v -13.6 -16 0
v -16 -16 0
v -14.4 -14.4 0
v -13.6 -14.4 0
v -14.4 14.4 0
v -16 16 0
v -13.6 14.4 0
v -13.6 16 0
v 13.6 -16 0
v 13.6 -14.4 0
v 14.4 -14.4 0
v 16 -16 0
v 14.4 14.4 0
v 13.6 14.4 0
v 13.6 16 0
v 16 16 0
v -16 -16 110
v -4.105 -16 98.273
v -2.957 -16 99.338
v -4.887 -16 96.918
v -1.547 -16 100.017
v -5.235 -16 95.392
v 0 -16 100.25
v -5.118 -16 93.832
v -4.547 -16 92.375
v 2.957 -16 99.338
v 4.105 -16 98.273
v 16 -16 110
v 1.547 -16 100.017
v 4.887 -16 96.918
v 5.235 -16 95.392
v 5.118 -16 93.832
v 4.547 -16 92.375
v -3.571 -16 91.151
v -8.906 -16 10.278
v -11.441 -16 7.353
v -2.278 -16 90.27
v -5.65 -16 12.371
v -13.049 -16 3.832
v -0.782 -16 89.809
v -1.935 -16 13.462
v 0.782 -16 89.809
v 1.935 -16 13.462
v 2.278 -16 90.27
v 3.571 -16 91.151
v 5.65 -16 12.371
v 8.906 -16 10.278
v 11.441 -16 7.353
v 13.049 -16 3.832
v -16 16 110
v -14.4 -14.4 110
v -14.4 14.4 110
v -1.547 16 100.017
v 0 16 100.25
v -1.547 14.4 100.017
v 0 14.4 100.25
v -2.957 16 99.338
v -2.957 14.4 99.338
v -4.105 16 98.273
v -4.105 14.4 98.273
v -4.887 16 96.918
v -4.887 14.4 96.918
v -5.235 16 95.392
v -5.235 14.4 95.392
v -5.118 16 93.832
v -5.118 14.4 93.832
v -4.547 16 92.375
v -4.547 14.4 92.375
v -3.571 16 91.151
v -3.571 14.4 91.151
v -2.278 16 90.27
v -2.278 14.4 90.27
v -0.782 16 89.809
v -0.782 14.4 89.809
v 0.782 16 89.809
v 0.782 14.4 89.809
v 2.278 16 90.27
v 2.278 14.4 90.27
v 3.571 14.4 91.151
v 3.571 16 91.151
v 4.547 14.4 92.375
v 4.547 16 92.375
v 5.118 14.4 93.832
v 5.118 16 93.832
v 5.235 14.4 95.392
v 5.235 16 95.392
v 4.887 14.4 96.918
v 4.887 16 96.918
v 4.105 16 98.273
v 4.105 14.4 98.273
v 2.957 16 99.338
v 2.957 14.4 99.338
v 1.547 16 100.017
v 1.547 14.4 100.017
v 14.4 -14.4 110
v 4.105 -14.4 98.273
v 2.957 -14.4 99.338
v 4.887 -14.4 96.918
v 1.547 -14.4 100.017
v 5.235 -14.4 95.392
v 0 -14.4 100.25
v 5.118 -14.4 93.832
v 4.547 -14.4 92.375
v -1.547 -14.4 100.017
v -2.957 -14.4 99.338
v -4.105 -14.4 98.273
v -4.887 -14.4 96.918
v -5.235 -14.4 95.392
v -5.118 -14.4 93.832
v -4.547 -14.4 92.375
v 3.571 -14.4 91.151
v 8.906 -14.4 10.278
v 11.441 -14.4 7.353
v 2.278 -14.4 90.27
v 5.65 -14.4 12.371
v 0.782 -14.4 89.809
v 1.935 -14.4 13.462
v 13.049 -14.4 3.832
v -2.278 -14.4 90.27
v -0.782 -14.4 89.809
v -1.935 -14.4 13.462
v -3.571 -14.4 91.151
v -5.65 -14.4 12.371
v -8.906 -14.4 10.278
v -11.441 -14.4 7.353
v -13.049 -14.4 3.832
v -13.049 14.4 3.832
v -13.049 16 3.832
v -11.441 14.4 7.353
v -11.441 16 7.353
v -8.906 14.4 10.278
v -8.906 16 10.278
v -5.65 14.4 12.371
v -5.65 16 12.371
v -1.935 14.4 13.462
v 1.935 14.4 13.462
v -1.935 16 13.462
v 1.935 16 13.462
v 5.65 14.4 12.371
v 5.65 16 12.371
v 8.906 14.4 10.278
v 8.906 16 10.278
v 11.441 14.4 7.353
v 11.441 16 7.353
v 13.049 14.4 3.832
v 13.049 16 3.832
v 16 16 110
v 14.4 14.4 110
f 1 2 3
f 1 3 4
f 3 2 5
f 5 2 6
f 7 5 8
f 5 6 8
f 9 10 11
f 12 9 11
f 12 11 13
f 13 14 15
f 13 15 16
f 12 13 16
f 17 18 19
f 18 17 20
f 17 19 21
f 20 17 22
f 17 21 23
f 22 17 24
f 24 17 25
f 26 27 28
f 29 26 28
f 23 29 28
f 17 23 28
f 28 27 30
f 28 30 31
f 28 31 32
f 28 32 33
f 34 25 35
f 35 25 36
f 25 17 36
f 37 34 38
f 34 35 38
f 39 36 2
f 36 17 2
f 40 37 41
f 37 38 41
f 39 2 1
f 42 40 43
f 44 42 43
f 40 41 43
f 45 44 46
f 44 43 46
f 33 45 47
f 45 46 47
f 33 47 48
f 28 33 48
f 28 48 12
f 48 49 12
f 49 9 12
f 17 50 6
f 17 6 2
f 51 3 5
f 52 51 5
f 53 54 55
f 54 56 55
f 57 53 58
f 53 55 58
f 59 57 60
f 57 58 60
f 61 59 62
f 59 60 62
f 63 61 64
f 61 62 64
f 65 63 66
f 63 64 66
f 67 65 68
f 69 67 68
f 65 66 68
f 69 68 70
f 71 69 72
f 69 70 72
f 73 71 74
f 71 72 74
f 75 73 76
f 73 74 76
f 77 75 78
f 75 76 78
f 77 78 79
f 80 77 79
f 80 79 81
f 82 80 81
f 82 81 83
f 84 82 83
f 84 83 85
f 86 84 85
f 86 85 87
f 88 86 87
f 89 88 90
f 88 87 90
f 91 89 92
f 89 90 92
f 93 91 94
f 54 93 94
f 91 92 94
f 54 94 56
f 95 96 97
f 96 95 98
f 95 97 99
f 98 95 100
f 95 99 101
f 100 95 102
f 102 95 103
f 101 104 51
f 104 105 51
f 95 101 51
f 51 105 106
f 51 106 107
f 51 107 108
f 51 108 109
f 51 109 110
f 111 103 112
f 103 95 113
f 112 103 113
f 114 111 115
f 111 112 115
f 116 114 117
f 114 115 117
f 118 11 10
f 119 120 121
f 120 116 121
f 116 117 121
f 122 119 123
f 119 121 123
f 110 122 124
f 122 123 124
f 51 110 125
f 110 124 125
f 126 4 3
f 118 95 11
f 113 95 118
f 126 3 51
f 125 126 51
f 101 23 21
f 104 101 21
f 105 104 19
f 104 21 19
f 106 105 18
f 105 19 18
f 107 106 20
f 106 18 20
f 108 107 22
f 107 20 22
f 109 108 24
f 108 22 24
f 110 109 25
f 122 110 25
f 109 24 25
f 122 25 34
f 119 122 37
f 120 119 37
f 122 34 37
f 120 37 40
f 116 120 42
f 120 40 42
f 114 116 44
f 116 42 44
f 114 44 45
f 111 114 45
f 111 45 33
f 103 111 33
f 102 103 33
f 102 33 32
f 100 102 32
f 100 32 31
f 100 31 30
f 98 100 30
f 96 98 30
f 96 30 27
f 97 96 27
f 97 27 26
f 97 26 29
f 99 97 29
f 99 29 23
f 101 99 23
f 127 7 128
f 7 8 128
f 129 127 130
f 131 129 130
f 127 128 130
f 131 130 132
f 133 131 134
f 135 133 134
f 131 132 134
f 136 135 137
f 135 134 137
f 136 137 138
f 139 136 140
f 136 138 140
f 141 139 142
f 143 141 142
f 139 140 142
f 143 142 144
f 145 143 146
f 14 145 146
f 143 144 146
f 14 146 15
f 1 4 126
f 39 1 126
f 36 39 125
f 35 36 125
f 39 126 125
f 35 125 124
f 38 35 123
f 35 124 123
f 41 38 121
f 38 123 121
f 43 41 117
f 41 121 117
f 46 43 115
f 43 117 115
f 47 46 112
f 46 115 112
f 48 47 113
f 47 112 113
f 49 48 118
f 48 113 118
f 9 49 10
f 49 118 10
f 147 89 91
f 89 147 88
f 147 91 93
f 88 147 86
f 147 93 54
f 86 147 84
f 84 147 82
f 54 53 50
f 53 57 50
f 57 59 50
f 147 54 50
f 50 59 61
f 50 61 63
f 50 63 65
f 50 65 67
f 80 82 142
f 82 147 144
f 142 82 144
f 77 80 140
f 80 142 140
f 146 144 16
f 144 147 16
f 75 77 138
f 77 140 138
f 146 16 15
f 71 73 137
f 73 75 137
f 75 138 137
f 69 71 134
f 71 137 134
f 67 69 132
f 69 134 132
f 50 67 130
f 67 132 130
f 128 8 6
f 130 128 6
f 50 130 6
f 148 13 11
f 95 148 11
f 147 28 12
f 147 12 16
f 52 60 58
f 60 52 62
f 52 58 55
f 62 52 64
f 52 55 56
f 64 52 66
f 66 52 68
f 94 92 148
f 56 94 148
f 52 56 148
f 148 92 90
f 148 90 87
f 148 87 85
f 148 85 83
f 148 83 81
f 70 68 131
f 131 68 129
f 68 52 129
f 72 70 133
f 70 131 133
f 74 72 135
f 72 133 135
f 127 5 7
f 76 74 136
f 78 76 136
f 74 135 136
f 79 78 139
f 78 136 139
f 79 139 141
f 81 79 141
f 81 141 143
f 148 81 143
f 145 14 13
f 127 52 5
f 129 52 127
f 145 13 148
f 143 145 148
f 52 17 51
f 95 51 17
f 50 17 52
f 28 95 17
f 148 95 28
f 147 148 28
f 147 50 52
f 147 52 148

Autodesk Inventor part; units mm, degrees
ref_plane "YZ Plane" through (0, 0, 0) normal (1, 0, 0) x (0, 1, 0)
ref_plane "XZ Plane" through (0, 0, 0) normal (0, 1, 0) x (-1, 0, 0)
ref_plane "XY Plane" through (0, 0, 0) normal (0, 0, 1) x (1, 0, 0)
sketch "スケッチ1" plane through (0, 0, 0) normal (0, 0, 1) x (1, 0, 0)
  line L0 (-16, -16) -> (16, -16)
  line L1 (16, -16) -> (16, 16)
  line L2 (16, 16) -> (-16, 16)
  line L3 (-16, 16) -> (-16, -16)
  line L4 (-16, -16) -> (16, 16) construction
  line L5 (16, -16) -> (-16, 16) construction
  line L6 (-14.4, 14.4) -> (14.4, 14.4)
  line L7 (14.4, 14.4) -> (14.4, -14.4)
  line L8 (14.4, -14.4) -> (-14.4, -14.4)
  line L9 (-14.4, -14.4) -> (-14.4, 14.4)
  point P0 (0, 0)
  dimension "d0" = 32
  dimension "d1" = 32
  dimension "d2" = 1.6
extrude "押し出し1" add sketch "スケッチ1" along normal blind 110
sketch "スケッチ2" plane through (-16, 16, 0) normal (0, 1, 0) x (1, 0, 0)
  circle A0 centre (16, 0) radius 13.6
  dimension "d5" = 27.2
extrude "押し出し2" cut sketch "スケッチ2" against normal blind 32
sketch "スケッチ3" plane through (-16, 16, 110) normal (0, 1, 0) x (1, 0, 0)
  line L0 (32, 0) -> (0, 0) projected
  point P0 (16, 110)
  point P1 (16, 15)
  dimension "d16" = 95
hole "穴1" at (0, 16, 95) direction (0, -1, 0) diameter 10.5 end through all
sketch "スケッチ4" plane through (-16, 16, 110) normal (0, 1, 0) x (1, 0, 0)
  circle A0 centre (16, 15) radius 13.6
  point P0 (16, 110)
  dimension "d17" = 95
  dimension "d18" = 27.2
properties part number "軸受上用"
